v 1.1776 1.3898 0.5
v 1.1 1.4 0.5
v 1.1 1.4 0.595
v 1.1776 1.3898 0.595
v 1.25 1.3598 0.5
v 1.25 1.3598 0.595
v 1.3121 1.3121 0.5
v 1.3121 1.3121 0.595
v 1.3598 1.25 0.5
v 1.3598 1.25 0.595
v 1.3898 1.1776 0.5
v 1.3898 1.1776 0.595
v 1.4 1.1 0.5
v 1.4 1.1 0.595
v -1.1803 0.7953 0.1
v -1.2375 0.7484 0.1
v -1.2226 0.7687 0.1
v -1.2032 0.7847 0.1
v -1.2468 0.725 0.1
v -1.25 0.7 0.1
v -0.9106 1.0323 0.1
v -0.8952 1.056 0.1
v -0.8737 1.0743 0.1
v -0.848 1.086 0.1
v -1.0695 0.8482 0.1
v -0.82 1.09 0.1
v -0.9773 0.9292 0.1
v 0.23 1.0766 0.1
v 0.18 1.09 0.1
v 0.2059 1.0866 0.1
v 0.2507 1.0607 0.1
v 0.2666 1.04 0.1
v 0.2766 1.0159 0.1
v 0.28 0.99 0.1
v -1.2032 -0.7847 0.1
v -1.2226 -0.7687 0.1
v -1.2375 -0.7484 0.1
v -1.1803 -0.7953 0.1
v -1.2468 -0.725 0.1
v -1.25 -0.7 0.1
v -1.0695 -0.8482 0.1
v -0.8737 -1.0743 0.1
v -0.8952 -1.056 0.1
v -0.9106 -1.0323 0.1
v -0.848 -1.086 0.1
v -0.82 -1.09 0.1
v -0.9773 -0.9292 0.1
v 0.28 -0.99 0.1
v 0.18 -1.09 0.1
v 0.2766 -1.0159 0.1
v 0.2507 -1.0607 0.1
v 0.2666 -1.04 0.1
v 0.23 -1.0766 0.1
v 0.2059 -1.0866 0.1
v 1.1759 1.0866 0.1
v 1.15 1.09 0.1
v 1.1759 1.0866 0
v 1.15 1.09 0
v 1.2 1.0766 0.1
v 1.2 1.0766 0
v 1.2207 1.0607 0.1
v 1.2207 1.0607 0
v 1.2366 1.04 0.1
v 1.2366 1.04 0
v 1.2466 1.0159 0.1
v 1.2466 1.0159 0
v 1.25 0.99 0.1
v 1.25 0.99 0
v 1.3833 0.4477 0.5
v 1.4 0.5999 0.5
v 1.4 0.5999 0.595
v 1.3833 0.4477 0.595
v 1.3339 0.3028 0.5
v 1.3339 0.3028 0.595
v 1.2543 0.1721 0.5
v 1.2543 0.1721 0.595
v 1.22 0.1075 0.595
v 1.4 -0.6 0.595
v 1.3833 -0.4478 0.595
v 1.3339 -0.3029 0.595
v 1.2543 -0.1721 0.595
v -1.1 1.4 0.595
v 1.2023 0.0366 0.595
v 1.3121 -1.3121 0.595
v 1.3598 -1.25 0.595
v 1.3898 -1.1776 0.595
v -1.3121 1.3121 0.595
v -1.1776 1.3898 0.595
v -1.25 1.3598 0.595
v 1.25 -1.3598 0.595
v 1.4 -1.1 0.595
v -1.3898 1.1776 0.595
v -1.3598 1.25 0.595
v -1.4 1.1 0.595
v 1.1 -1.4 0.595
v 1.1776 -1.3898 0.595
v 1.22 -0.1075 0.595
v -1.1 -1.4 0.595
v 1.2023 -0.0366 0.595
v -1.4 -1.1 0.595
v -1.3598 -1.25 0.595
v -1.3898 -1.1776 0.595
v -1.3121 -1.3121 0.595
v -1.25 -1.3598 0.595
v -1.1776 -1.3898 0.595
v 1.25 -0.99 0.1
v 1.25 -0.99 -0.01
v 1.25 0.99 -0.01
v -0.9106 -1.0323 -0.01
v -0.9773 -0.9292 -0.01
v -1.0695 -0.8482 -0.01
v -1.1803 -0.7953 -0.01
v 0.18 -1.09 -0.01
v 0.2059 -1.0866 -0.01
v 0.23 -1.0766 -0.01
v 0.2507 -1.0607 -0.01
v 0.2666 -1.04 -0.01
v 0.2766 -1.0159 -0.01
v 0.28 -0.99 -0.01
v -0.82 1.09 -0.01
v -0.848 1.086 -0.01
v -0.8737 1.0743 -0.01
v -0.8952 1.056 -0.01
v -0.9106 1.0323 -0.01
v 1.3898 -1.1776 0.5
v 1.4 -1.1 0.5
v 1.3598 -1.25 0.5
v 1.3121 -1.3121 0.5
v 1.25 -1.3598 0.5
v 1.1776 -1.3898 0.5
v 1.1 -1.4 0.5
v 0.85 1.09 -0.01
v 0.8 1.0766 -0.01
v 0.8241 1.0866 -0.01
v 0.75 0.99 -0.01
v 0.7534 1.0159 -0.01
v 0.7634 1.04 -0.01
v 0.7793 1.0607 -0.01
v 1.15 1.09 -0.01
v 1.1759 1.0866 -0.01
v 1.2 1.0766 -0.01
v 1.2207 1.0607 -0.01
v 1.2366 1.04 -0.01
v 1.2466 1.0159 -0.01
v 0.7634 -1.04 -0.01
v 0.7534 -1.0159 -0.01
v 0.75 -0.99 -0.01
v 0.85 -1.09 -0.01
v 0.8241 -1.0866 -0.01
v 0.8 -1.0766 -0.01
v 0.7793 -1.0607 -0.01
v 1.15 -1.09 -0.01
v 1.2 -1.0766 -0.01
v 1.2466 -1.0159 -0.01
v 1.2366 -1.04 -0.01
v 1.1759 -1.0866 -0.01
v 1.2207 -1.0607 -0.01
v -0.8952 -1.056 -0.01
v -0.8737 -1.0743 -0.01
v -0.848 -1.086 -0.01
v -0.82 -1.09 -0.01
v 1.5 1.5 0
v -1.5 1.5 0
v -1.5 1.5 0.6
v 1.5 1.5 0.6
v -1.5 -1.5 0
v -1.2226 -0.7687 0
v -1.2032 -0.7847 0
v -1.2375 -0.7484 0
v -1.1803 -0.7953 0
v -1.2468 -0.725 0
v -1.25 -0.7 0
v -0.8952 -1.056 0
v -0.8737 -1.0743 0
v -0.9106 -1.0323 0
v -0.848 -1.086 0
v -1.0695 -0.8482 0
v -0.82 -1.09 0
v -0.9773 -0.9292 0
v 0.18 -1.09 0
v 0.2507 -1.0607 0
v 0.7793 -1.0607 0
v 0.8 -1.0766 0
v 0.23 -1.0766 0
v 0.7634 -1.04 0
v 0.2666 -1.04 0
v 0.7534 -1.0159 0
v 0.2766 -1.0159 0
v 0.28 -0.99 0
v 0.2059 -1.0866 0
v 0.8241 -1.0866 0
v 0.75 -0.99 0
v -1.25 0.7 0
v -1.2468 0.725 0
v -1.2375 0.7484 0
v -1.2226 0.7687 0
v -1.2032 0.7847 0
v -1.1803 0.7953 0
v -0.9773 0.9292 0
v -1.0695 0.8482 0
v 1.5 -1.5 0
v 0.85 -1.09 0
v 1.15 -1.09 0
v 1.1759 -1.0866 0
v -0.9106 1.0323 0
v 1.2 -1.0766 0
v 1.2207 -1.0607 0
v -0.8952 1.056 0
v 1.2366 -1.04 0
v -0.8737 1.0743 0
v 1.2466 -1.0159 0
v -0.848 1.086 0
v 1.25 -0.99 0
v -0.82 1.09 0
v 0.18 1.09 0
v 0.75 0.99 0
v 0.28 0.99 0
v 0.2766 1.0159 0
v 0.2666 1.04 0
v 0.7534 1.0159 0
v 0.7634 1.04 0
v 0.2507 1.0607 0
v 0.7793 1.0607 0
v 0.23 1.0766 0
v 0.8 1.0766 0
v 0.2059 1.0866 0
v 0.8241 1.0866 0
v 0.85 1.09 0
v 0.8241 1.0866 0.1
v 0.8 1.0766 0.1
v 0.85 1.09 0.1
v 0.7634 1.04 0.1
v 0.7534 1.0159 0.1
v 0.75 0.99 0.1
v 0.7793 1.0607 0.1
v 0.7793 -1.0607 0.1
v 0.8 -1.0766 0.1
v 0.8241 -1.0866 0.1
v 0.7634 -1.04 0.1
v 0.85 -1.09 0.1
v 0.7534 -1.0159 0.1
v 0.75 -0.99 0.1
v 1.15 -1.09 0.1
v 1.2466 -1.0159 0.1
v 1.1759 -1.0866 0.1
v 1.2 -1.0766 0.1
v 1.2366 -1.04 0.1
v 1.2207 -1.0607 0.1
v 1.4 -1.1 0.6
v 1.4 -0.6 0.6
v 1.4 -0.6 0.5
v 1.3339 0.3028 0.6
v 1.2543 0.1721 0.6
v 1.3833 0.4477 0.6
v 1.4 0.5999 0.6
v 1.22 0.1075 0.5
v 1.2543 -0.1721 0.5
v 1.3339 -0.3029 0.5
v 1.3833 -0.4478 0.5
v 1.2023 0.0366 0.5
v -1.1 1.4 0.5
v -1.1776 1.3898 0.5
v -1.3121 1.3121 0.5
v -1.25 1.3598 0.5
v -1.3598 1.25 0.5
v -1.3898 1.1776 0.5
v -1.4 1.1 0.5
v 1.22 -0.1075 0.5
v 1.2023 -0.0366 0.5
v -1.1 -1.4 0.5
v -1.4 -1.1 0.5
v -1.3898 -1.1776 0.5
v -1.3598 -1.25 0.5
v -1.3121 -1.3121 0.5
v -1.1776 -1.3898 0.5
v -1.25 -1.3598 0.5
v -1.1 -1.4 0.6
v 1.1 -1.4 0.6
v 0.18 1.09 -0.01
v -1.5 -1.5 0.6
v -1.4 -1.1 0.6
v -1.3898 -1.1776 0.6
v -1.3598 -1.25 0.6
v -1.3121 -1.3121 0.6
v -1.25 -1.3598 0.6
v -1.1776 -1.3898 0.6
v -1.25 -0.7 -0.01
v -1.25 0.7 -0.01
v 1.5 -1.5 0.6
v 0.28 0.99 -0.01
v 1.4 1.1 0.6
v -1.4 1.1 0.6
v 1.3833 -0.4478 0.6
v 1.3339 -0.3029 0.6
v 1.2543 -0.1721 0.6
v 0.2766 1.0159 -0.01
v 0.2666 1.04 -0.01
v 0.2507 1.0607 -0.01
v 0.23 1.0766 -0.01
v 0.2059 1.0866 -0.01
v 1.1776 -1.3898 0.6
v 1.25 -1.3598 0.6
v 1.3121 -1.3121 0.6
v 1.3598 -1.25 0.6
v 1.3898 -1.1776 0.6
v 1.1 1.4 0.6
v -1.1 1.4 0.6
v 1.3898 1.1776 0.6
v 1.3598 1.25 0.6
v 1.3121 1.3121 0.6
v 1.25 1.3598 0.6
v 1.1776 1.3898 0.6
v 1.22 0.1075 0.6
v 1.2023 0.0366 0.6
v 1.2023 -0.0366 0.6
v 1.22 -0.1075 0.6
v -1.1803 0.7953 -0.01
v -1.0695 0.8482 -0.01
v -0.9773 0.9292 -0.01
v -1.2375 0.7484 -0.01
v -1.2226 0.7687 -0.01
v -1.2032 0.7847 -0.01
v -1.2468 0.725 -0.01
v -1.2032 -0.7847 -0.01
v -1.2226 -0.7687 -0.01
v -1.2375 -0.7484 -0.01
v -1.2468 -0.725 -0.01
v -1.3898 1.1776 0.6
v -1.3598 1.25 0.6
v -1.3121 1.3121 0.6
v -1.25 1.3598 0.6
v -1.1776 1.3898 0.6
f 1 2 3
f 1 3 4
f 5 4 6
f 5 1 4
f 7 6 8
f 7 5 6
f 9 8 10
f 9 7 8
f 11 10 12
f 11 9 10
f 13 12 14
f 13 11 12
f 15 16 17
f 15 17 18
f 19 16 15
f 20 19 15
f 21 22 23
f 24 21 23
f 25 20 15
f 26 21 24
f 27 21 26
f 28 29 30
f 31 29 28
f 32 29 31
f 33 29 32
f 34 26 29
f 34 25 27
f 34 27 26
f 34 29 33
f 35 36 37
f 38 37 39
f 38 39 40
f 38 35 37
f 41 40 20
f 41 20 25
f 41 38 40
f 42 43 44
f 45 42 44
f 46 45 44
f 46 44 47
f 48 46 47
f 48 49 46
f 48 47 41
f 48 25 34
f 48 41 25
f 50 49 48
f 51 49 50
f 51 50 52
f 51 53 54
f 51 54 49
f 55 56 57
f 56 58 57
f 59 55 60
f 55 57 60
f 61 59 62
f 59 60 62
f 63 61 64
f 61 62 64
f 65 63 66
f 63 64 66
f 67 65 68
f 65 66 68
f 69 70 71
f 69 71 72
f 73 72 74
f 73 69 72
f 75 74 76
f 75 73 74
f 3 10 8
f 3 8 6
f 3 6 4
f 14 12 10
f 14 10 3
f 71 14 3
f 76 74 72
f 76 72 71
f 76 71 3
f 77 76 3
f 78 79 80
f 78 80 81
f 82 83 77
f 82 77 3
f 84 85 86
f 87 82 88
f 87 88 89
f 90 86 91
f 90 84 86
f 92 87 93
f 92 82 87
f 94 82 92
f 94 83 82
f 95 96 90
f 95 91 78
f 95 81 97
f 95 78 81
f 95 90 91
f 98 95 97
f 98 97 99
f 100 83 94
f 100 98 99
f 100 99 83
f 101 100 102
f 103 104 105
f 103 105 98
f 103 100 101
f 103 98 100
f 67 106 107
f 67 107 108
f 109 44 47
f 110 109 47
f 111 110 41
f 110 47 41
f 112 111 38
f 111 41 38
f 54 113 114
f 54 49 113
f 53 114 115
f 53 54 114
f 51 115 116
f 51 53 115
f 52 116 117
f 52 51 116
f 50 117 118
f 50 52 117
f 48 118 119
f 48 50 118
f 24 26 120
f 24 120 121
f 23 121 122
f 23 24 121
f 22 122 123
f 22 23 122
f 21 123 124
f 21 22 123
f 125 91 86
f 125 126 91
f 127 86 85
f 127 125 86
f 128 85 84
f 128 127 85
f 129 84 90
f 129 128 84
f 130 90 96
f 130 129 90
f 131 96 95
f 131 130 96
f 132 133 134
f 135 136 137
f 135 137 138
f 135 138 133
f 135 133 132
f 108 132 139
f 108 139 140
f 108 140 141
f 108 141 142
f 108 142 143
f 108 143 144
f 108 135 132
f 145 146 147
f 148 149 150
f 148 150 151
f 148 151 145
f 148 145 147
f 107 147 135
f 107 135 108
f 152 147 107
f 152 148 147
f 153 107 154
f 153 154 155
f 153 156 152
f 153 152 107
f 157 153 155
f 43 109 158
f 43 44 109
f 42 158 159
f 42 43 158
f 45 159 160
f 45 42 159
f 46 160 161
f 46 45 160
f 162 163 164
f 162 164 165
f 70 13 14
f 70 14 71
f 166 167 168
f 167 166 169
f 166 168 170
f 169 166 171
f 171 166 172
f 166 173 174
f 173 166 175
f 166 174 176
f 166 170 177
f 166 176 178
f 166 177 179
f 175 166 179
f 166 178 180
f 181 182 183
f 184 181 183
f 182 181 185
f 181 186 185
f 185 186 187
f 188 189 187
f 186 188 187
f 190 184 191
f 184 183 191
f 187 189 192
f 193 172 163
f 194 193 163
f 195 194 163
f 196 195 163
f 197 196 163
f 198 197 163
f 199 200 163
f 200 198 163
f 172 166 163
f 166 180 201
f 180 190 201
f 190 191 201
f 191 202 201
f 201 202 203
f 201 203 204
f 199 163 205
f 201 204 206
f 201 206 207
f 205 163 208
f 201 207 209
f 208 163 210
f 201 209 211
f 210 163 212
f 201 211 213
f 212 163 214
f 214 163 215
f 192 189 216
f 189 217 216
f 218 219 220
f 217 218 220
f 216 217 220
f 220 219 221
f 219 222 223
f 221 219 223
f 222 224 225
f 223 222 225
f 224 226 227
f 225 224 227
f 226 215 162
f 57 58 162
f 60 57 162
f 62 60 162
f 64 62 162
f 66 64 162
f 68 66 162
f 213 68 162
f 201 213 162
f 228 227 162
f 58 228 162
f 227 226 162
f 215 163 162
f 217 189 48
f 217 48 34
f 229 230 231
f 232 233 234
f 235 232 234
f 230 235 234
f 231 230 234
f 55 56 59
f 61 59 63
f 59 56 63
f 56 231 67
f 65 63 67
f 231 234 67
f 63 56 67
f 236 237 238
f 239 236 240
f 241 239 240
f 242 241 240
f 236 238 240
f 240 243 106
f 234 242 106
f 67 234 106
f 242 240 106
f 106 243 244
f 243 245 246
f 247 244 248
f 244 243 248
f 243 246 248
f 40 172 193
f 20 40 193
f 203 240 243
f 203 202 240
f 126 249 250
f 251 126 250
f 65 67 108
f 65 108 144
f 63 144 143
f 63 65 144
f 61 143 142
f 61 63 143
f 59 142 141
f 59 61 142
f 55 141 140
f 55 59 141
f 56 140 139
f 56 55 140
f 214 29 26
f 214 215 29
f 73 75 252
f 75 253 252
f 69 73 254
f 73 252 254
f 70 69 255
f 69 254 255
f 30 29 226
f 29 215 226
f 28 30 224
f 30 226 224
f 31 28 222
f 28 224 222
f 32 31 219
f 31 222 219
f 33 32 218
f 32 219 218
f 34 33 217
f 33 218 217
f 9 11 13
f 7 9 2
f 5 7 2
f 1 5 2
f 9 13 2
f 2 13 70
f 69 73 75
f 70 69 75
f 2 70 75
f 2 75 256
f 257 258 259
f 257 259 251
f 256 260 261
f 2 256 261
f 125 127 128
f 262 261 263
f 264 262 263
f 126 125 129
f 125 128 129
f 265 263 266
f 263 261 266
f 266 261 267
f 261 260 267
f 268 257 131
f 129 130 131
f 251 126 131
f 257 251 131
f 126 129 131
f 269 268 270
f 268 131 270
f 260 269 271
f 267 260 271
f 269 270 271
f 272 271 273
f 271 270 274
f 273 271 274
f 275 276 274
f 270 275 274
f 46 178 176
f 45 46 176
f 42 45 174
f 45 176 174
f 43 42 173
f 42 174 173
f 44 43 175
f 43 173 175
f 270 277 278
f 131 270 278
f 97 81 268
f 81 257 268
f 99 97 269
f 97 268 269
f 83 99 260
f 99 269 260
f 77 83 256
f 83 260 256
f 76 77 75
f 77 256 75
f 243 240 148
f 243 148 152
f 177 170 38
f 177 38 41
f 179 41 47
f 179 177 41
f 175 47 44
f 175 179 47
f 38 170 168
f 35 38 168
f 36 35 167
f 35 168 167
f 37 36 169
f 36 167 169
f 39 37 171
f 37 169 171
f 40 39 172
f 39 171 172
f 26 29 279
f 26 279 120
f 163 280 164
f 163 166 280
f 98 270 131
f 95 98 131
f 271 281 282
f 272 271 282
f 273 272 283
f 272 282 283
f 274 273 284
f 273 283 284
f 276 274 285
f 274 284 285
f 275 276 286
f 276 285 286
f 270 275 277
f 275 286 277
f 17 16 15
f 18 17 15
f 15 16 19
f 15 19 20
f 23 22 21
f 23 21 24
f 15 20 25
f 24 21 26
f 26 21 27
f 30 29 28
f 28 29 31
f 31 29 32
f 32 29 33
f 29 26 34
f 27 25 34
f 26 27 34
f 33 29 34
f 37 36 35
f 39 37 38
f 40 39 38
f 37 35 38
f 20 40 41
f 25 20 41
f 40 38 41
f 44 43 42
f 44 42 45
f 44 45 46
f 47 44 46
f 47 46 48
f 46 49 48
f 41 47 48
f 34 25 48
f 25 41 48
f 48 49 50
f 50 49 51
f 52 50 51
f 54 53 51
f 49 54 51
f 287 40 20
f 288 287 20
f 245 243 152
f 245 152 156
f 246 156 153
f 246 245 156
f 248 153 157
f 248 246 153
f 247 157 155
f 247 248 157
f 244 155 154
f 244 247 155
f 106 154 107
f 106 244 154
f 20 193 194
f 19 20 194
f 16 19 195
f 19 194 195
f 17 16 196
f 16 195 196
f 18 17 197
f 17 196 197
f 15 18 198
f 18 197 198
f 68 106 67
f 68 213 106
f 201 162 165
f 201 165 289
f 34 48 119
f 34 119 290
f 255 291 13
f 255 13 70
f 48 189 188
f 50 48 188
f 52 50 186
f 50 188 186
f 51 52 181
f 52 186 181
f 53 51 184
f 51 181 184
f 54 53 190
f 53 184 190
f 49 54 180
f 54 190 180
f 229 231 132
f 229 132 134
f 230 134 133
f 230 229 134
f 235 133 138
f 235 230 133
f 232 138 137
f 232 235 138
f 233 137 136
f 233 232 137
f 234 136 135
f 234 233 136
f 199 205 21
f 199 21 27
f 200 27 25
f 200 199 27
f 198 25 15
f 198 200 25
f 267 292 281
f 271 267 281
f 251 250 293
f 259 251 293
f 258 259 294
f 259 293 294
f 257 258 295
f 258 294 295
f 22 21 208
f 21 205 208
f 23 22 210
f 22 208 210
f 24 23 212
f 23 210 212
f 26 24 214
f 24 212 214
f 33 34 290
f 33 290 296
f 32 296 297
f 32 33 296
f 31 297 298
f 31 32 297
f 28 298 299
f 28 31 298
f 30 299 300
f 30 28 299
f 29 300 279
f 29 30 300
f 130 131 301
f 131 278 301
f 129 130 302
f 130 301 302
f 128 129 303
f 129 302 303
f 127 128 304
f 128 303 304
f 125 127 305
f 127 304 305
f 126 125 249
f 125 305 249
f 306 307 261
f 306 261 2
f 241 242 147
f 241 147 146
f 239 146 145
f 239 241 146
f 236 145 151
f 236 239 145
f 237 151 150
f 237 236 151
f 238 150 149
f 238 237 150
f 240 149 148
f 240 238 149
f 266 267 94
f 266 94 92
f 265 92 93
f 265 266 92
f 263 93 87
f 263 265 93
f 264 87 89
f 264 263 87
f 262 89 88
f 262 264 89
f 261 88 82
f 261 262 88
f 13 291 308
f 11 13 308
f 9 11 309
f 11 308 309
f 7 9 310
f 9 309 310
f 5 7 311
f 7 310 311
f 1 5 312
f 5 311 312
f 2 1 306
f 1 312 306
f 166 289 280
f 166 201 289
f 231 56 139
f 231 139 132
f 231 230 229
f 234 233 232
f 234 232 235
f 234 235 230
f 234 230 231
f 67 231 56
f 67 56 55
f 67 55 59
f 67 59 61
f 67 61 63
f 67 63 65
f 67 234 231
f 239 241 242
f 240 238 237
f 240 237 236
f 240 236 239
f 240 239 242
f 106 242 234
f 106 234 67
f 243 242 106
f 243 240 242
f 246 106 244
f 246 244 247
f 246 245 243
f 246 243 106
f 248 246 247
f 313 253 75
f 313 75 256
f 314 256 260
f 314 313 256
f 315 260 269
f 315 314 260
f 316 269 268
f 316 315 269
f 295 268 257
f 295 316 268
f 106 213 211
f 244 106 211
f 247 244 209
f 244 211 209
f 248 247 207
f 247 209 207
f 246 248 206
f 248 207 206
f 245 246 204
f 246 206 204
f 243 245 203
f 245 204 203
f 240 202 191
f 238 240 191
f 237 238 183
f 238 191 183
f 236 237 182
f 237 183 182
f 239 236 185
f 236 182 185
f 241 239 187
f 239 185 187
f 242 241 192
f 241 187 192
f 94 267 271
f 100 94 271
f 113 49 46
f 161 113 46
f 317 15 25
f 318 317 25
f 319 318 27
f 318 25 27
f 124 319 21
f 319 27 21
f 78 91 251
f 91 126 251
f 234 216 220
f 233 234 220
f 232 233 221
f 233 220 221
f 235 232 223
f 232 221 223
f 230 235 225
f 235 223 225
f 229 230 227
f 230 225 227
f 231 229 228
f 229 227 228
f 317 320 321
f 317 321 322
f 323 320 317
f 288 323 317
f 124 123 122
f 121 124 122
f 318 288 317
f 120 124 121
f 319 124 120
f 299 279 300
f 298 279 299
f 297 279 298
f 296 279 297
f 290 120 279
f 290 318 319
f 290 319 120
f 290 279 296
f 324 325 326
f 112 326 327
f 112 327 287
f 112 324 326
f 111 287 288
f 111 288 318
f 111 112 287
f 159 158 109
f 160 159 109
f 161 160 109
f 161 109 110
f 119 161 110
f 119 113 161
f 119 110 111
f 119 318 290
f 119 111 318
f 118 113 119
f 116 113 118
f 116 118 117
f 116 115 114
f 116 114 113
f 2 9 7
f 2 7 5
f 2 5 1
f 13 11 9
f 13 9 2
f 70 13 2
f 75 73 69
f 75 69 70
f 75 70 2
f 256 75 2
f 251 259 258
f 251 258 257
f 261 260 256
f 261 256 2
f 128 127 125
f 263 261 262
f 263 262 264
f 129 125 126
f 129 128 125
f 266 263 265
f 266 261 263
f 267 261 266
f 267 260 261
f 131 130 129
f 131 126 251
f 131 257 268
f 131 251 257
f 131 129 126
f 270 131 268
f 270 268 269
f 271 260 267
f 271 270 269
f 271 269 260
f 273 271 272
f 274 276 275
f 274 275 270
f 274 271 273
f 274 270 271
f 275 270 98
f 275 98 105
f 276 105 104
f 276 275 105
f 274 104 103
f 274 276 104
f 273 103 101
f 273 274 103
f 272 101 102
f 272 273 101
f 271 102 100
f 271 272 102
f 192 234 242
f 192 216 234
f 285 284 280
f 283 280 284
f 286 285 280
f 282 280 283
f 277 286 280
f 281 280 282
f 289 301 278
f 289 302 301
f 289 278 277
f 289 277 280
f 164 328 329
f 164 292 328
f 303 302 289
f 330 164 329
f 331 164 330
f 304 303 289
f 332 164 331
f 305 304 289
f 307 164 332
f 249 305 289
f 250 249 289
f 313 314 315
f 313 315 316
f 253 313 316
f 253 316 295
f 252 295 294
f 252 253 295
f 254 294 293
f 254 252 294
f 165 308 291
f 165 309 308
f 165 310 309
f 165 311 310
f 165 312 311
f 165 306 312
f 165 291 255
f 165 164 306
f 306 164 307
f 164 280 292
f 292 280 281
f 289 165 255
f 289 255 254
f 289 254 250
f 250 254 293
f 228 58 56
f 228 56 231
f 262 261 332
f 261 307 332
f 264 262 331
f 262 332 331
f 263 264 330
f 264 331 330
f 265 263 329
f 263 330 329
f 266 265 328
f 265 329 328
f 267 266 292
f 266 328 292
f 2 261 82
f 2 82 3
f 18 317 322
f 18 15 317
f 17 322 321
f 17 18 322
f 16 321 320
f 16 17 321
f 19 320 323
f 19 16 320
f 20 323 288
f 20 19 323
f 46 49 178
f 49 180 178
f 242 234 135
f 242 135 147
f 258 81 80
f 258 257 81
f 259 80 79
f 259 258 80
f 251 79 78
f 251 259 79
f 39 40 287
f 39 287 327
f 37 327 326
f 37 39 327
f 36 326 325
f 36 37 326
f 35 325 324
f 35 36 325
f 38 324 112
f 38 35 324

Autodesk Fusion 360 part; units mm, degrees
sketch "Sketch1" plane through (0, 0, 0) normal (0, 0, 1) x (1, 0, 0) in component "Body"
  line L0 (1.5, -1.5) -> (-1.5, -1.5)
  line L1 (-1.5, -1.5) -> (-1.5, 1.5)
  line L2 (-1.5, 1.5) -> (1.5, 1.5)
  line L3 (1.5, 1.5) -> (1.5, -1.5)
  line L4 (1.5, -1.5) -> (-1.5, 1.5) construction
  line L5 (-1.5, -1.5) -> (1.5, 1.5) construction
  dimension "d1" = 3
  dimension "d2" = 3
extrude "Extrude1" add sketch "Sketch1" along normal blind 0.6 makes body 1 in component "Body"
sketch "Sketch2" plane through (0, 0, 0.6) normal (0, 0, 1) x (-1, 0, 0) in component "Body"
  line L0 (-1.5, -1.5) -> (1.5, -1.5)
  line L1 (1.5, -1.5) -> (1.5, 1.5)
  line L2 (1.5, 1.5) -> (-1.5, 1.5)
  line L3 (-1.5, 1.5) -> (-1.5, -1.5)
  line L4 (-1.4, 1.4) -> (1.4, 1.4) construction
  line L5 (1.4, 1.4) -> (1.4, -1.4) construction
  line L6 (1.4, -1.4) -> (-1.4, -1.4) construction
  line L7 (-1.4, -1.4) -> (-1.4, 1.4) construction
  line L8 (-1.4, 1.4) -> (1.4, -1.4) construction
  line L9 (1.4, 1.4) -> (-1.4, -1.4) construction
  line L10 (1.4, 0) -> (-1.4, 0) construction
  arc A0 (1.1, -1.4) -> (1.4, -1.1) centre (1.1, -1.1) ccw
  line L11 (1.1, -1.1) -> (1.1, -1.4) construction
  line L12 (1.1, -1.1) -> (1.4, -1.1) construction
  arc A1 (-1.4, -1.1) -> (-1.1, -1.4) centre (-1.1, -1.1) ccw
  line L13 (-1.1, -1.1) -> (-1.4, -1.1) construction
  line L14 (-1.1, -1.1) -> (-1.1, -1.4) construction
  arc A2 (1.4, 1.1) -> (1.1, 1.4) centre (1.1, 1.1) ccw
  line L15 (1.1, 1.1) -> (1.4, 1.1) construction
  line L16 (1.1, 1.1) -> (1.1, 1.4) construction
  arc A3 (-1.1, 1.4) -> (-1.4, 1.1) centre (-1.1, 1.1) ccw
  line L17 (-1.1, 1.1) -> (-1.1, 1.4) construction
  line L18 (-1.1, 1.1) -> (-1.4, 1.1) construction
  line L19 (1.4, -1.1) -> (1.4, 1.1)
  line L20 (1.1, -1.4) -> (-1.1, -1.4)
  line L21 (1.1, 1.4) -> (-1.1, 1.4)
  line L22 (-1.4, 0) -> (-2.4, 0) construction
  line L23 (-1.4, -1.1) -> (-1.4, -1.0999)
  line L24 (-1.4, -1.0999) -> (-1.4, -0.5999)
  line L25 (-1.4, 1.1) -> (-1.4, 0.6)
  circle A4 centre (-1.5, 0) radius 0.3 construction
  arc A5 (-1.2543, -0.1721) -> (-1.2543, 0.1721) centre (-1.5, 0) ccw
  line L26 (-1.5, 0) -> (-1.2543, -0.1721) construction
  line L27 (-1.5, 0) -> (-1.2543, 0.1721) construction
  arc A6 (-1.2543, -0.1721) -> (-1.4, -0.5999) centre (-0.6989, -0.6) ccw
  arc A7 (-1.4, 0.6) -> (-1.2543, 0.1721) centre (-0.6989, 0.6) ccw
  dimension "d5" = 2.8
  dimension "d6" = 2.8
  dimension "d7" = 90
  dimension "d8" = 90
  dimension "d9" = 90
  dimension "d10" = 90
  dimension "d11" = 0.3
  dimension "d12" = 0.3
  dimension "d13" = 0.3
  dimension "d14" = 0.3
  dimension "d16" = 1
  dimension "d17" = 0.5
  dimension "d18" = 0.5
  dimension "d23" = 0.3
  dimension "d24" = 0.6
  dimension "d25" = 70
extrude "Extrude2" cut sketch "Sketch2" against normal blind 0.1 contours A0 A1 A2 A3 L19 L20 L21 L24 L25 A5 A6 A7 bodies 1 in component "Body"
sketch "Sketch3" plane through (0, 0, 0) normal (0, 0, -1) x (1, 0, 0) in component "Body"
  line L0 (-1.5, -1.5) -> (1.5, -1.5)
  line L1 (1.5, -1.5) -> (1.5, 1.5)
  line L2 (1.5, 1.5) -> (-1.5, 1.5)
  line L3 (-1.5, 1.5) -> (-1.5, -1.5)
  line L4 (-1.5, 0) -> (1.5, 0) construction
  line L5 (0.28, -1.09) -> (-1.25, -1.09) construction
  line L6 (-1.25, -1.09) -> (-1.25, 1.09) construction
  line L7 (-1.25, 1.09) -> (0.28, 1.09) construction
  line L8 (0.28, 1.09) -> (0.28, -1.09) construction
  line L9 (0.28, -1.09) -> (-1.25, 1.09) construction
  line L10 (-1.25, -1.09) -> (0.28, 1.09) construction
  line L11 (1.25, -1.09) -> (0.75, -1.09) construction
  line L12 (0.75, -1.09) -> (0.75, 1.09) construction
  line L13 (0.75, 1.09) -> (1.25, 1.09) construction
  line L14 (1.25, 1.09) -> (1.25, -1.09) construction
  line L15 (1.25, -1.09) -> (0.75, 1.09) construction
  line L16 (0.75, -1.09) -> (1.25, 1.09) construction
  line L17 (1.25, -1.09) -> (1.5, -1.09) construction
  line L18 (-1.25, -1.09) -> (-1.5, -1.09) construction
  arc A0 (1.25, 0.99) -> (1.15, 1.09) centre (1.15, 0.99) ccw
  line L19 (1.15, 0.99) -> (1.25, 0.99) construction
  line L20 (1.15, 0.99) -> (1.15, 1.09) construction
  arc A1 (0.85, 1.09) -> (0.75, 0.99) centre (0.85, 0.99) ccw
  line L21 (0.85, 0.99) -> (0.85, 1.09) construction
  line L22 (0.85, 0.99) -> (0.75, 0.99) construction
  arc A2 (1.15, -1.09) -> (1.25, -0.99) centre (1.15, -0.99) ccw
  line L23 (1.15, -0.99) -> (1.15, -1.09) construction
  line L24 (1.15, -0.99) -> (1.25, -0.99) construction
  arc A3 (0.75, -0.99) -> (0.85, -1.09) centre (0.85, -0.99) ccw
  line L25 (0.85, -0.99) -> (0.75, -0.99) construction
  line L26 (0.85, -0.99) -> (0.85, -1.09) construction
  arc A4 (0.18, -1.09) -> (0.28, -0.99) centre (0.18, -0.99) ccw
  line L27 (0.18, -0.99) -> (0.18, -1.09) construction
  line L28 (0.18, -0.99) -> (0.28, -0.99) construction
  arc A5 (0.28, 0.99) -> (0.18, 1.09) centre (0.18, 0.99) ccw
  line L29 (0.18, 0.99) -> (0.28, 0.99) construction
  line L30 (0.18, 0.99) -> (0.18, 1.09) construction
  line L31 (1.25, 0.99) -> (1.25, -0.99)
  line L32 (1.15, -1.09) -> (0.85, -1.09)
  line L33 (0.75, -0.99) -> (0.75, 0.99)
  line L34 (0.85, 1.09) -> (1.15, 1.09)
  line L35 (0.28, 0.99) -> (0.28, -0.99)
  line L36 (-1.25, 0.7) -> (-1.25, -0.7)
  arc A6 (-1.1803, 0.7953) -> (-1.25, 0.7) centre (-1.15, 0.7) ccw
  line L37 (-1.15, 0.7) -> (-1.1803, 0.7953) construction
  line L38 (-1.15, 0.7) -> (-1.25, 0.7) construction
  arc A7 (-1.25, -0.7) -> (-1.1803, -0.7953) centre (-1.15, -0.7) ccw
  line L39 (-1.15, -0.7) -> (-1.25, -0.7) construction
  line L40 (-1.15, -0.7) -> (-1.1803, -0.7953) construction
  arc A8 (-0.82, 1.09) -> (-0.9106, 1.0323) centre (-0.82, 0.99) ccw
  line L41 (-0.82, 0.99) -> (-0.82, 1.09) construction
  line L42 (-0.82, 0.99) -> (-0.9106, 1.0323) construction
  line L43 (0.18, 1.09) -> (-0.82, 1.09)
  line L44 (0.18, -1.09) -> (-0.82, -1.09)
  arc A9 (-0.9106, -1.0323) -> (-0.82, -1.09) centre (-0.82, -0.99) ccw
  line L45 (-0.82, -0.99) -> (-0.9106, -1.0323) construction
  line L46 (-0.82, -0.99) -> (-0.82, -1.09) construction
  arc A10 (-1.1803, 0.7953) -> (-0.9106, 1.0323) centre (-1.3155, 1.221) ccw
  arc A11 (-0.9106, -1.0323) -> (-1.1803, -0.7953) centre (-1.3155, -1.221) ccw
  point P0 (-0.485, 0)
  point P1 (1, 0)
  dimension "d28" = 1.53
  dimension "d29" = 2.18
  dimension "d30" = 0.5
  dimension "d31" = 2.18
  dimension "d32" = 0.47
  dimension "d33" = 90
  dimension "d34" = 90
  dimension "d35" = 90
  dimension "d36" = 90
  dimension "d37" = 90
  dimension "d38" = 90
  dimension "d39" = 0.1
  dimension "d43" = 65
  dimension "d45" = 0.1
  dimension "d46" = 1
  dimension "d47" = 1
  dimension "d48" = 65
  dimension "d49" = 0.1
  dimension "d50" = 1.4
extrude "Extrude3" cut sketch "Sketch3" against normal blind 0.1 contours A0 A1 A2 A3 L31 L32 L33 L34 | A4 A5 L35 L36 A6 A7 A8 L43 L44 A9 A10 A11 bodies 1 in component "Body"
extrude "Extrude1'" add 1 faces at (-0.5331, 0.0068, 0.5) along direction (0, 0, 1) blind 0.095 separate body on bodies 1 makes body 2 in component "Element"
extrude "Extrude1''" add 2 faces at (-0.1535, 0.2952, 0.1) (1.0833, -0.33, 0.1) along direction (0, 0, -1) blind 0.11 separate body on bodies 1 makes body 3 at (-0.1535, 0.2952, 0.1) makes body 4 at (1.0833, -0.33, 0.1) in component "Pads"
component "Body" placed x (1, 0, 0) y (0, 1, 0) z (0, 0, 1) at (0, 0, 0)
component "Element" placed x (1, 0, 0) y (0, 1, 0) z (0, 0, 1) at (0, 0, 0)
component "Pads" placed x (1, 0, 0) y (0, 1, 0) z (0, 0, 1) at (0, 0, 0)
equation "d12 = d11"
equation "d13 = d11"
equation "d14 = d11"
equation "d45 = d39"
equation "d47 = d46"
equation "d49 = d45"
